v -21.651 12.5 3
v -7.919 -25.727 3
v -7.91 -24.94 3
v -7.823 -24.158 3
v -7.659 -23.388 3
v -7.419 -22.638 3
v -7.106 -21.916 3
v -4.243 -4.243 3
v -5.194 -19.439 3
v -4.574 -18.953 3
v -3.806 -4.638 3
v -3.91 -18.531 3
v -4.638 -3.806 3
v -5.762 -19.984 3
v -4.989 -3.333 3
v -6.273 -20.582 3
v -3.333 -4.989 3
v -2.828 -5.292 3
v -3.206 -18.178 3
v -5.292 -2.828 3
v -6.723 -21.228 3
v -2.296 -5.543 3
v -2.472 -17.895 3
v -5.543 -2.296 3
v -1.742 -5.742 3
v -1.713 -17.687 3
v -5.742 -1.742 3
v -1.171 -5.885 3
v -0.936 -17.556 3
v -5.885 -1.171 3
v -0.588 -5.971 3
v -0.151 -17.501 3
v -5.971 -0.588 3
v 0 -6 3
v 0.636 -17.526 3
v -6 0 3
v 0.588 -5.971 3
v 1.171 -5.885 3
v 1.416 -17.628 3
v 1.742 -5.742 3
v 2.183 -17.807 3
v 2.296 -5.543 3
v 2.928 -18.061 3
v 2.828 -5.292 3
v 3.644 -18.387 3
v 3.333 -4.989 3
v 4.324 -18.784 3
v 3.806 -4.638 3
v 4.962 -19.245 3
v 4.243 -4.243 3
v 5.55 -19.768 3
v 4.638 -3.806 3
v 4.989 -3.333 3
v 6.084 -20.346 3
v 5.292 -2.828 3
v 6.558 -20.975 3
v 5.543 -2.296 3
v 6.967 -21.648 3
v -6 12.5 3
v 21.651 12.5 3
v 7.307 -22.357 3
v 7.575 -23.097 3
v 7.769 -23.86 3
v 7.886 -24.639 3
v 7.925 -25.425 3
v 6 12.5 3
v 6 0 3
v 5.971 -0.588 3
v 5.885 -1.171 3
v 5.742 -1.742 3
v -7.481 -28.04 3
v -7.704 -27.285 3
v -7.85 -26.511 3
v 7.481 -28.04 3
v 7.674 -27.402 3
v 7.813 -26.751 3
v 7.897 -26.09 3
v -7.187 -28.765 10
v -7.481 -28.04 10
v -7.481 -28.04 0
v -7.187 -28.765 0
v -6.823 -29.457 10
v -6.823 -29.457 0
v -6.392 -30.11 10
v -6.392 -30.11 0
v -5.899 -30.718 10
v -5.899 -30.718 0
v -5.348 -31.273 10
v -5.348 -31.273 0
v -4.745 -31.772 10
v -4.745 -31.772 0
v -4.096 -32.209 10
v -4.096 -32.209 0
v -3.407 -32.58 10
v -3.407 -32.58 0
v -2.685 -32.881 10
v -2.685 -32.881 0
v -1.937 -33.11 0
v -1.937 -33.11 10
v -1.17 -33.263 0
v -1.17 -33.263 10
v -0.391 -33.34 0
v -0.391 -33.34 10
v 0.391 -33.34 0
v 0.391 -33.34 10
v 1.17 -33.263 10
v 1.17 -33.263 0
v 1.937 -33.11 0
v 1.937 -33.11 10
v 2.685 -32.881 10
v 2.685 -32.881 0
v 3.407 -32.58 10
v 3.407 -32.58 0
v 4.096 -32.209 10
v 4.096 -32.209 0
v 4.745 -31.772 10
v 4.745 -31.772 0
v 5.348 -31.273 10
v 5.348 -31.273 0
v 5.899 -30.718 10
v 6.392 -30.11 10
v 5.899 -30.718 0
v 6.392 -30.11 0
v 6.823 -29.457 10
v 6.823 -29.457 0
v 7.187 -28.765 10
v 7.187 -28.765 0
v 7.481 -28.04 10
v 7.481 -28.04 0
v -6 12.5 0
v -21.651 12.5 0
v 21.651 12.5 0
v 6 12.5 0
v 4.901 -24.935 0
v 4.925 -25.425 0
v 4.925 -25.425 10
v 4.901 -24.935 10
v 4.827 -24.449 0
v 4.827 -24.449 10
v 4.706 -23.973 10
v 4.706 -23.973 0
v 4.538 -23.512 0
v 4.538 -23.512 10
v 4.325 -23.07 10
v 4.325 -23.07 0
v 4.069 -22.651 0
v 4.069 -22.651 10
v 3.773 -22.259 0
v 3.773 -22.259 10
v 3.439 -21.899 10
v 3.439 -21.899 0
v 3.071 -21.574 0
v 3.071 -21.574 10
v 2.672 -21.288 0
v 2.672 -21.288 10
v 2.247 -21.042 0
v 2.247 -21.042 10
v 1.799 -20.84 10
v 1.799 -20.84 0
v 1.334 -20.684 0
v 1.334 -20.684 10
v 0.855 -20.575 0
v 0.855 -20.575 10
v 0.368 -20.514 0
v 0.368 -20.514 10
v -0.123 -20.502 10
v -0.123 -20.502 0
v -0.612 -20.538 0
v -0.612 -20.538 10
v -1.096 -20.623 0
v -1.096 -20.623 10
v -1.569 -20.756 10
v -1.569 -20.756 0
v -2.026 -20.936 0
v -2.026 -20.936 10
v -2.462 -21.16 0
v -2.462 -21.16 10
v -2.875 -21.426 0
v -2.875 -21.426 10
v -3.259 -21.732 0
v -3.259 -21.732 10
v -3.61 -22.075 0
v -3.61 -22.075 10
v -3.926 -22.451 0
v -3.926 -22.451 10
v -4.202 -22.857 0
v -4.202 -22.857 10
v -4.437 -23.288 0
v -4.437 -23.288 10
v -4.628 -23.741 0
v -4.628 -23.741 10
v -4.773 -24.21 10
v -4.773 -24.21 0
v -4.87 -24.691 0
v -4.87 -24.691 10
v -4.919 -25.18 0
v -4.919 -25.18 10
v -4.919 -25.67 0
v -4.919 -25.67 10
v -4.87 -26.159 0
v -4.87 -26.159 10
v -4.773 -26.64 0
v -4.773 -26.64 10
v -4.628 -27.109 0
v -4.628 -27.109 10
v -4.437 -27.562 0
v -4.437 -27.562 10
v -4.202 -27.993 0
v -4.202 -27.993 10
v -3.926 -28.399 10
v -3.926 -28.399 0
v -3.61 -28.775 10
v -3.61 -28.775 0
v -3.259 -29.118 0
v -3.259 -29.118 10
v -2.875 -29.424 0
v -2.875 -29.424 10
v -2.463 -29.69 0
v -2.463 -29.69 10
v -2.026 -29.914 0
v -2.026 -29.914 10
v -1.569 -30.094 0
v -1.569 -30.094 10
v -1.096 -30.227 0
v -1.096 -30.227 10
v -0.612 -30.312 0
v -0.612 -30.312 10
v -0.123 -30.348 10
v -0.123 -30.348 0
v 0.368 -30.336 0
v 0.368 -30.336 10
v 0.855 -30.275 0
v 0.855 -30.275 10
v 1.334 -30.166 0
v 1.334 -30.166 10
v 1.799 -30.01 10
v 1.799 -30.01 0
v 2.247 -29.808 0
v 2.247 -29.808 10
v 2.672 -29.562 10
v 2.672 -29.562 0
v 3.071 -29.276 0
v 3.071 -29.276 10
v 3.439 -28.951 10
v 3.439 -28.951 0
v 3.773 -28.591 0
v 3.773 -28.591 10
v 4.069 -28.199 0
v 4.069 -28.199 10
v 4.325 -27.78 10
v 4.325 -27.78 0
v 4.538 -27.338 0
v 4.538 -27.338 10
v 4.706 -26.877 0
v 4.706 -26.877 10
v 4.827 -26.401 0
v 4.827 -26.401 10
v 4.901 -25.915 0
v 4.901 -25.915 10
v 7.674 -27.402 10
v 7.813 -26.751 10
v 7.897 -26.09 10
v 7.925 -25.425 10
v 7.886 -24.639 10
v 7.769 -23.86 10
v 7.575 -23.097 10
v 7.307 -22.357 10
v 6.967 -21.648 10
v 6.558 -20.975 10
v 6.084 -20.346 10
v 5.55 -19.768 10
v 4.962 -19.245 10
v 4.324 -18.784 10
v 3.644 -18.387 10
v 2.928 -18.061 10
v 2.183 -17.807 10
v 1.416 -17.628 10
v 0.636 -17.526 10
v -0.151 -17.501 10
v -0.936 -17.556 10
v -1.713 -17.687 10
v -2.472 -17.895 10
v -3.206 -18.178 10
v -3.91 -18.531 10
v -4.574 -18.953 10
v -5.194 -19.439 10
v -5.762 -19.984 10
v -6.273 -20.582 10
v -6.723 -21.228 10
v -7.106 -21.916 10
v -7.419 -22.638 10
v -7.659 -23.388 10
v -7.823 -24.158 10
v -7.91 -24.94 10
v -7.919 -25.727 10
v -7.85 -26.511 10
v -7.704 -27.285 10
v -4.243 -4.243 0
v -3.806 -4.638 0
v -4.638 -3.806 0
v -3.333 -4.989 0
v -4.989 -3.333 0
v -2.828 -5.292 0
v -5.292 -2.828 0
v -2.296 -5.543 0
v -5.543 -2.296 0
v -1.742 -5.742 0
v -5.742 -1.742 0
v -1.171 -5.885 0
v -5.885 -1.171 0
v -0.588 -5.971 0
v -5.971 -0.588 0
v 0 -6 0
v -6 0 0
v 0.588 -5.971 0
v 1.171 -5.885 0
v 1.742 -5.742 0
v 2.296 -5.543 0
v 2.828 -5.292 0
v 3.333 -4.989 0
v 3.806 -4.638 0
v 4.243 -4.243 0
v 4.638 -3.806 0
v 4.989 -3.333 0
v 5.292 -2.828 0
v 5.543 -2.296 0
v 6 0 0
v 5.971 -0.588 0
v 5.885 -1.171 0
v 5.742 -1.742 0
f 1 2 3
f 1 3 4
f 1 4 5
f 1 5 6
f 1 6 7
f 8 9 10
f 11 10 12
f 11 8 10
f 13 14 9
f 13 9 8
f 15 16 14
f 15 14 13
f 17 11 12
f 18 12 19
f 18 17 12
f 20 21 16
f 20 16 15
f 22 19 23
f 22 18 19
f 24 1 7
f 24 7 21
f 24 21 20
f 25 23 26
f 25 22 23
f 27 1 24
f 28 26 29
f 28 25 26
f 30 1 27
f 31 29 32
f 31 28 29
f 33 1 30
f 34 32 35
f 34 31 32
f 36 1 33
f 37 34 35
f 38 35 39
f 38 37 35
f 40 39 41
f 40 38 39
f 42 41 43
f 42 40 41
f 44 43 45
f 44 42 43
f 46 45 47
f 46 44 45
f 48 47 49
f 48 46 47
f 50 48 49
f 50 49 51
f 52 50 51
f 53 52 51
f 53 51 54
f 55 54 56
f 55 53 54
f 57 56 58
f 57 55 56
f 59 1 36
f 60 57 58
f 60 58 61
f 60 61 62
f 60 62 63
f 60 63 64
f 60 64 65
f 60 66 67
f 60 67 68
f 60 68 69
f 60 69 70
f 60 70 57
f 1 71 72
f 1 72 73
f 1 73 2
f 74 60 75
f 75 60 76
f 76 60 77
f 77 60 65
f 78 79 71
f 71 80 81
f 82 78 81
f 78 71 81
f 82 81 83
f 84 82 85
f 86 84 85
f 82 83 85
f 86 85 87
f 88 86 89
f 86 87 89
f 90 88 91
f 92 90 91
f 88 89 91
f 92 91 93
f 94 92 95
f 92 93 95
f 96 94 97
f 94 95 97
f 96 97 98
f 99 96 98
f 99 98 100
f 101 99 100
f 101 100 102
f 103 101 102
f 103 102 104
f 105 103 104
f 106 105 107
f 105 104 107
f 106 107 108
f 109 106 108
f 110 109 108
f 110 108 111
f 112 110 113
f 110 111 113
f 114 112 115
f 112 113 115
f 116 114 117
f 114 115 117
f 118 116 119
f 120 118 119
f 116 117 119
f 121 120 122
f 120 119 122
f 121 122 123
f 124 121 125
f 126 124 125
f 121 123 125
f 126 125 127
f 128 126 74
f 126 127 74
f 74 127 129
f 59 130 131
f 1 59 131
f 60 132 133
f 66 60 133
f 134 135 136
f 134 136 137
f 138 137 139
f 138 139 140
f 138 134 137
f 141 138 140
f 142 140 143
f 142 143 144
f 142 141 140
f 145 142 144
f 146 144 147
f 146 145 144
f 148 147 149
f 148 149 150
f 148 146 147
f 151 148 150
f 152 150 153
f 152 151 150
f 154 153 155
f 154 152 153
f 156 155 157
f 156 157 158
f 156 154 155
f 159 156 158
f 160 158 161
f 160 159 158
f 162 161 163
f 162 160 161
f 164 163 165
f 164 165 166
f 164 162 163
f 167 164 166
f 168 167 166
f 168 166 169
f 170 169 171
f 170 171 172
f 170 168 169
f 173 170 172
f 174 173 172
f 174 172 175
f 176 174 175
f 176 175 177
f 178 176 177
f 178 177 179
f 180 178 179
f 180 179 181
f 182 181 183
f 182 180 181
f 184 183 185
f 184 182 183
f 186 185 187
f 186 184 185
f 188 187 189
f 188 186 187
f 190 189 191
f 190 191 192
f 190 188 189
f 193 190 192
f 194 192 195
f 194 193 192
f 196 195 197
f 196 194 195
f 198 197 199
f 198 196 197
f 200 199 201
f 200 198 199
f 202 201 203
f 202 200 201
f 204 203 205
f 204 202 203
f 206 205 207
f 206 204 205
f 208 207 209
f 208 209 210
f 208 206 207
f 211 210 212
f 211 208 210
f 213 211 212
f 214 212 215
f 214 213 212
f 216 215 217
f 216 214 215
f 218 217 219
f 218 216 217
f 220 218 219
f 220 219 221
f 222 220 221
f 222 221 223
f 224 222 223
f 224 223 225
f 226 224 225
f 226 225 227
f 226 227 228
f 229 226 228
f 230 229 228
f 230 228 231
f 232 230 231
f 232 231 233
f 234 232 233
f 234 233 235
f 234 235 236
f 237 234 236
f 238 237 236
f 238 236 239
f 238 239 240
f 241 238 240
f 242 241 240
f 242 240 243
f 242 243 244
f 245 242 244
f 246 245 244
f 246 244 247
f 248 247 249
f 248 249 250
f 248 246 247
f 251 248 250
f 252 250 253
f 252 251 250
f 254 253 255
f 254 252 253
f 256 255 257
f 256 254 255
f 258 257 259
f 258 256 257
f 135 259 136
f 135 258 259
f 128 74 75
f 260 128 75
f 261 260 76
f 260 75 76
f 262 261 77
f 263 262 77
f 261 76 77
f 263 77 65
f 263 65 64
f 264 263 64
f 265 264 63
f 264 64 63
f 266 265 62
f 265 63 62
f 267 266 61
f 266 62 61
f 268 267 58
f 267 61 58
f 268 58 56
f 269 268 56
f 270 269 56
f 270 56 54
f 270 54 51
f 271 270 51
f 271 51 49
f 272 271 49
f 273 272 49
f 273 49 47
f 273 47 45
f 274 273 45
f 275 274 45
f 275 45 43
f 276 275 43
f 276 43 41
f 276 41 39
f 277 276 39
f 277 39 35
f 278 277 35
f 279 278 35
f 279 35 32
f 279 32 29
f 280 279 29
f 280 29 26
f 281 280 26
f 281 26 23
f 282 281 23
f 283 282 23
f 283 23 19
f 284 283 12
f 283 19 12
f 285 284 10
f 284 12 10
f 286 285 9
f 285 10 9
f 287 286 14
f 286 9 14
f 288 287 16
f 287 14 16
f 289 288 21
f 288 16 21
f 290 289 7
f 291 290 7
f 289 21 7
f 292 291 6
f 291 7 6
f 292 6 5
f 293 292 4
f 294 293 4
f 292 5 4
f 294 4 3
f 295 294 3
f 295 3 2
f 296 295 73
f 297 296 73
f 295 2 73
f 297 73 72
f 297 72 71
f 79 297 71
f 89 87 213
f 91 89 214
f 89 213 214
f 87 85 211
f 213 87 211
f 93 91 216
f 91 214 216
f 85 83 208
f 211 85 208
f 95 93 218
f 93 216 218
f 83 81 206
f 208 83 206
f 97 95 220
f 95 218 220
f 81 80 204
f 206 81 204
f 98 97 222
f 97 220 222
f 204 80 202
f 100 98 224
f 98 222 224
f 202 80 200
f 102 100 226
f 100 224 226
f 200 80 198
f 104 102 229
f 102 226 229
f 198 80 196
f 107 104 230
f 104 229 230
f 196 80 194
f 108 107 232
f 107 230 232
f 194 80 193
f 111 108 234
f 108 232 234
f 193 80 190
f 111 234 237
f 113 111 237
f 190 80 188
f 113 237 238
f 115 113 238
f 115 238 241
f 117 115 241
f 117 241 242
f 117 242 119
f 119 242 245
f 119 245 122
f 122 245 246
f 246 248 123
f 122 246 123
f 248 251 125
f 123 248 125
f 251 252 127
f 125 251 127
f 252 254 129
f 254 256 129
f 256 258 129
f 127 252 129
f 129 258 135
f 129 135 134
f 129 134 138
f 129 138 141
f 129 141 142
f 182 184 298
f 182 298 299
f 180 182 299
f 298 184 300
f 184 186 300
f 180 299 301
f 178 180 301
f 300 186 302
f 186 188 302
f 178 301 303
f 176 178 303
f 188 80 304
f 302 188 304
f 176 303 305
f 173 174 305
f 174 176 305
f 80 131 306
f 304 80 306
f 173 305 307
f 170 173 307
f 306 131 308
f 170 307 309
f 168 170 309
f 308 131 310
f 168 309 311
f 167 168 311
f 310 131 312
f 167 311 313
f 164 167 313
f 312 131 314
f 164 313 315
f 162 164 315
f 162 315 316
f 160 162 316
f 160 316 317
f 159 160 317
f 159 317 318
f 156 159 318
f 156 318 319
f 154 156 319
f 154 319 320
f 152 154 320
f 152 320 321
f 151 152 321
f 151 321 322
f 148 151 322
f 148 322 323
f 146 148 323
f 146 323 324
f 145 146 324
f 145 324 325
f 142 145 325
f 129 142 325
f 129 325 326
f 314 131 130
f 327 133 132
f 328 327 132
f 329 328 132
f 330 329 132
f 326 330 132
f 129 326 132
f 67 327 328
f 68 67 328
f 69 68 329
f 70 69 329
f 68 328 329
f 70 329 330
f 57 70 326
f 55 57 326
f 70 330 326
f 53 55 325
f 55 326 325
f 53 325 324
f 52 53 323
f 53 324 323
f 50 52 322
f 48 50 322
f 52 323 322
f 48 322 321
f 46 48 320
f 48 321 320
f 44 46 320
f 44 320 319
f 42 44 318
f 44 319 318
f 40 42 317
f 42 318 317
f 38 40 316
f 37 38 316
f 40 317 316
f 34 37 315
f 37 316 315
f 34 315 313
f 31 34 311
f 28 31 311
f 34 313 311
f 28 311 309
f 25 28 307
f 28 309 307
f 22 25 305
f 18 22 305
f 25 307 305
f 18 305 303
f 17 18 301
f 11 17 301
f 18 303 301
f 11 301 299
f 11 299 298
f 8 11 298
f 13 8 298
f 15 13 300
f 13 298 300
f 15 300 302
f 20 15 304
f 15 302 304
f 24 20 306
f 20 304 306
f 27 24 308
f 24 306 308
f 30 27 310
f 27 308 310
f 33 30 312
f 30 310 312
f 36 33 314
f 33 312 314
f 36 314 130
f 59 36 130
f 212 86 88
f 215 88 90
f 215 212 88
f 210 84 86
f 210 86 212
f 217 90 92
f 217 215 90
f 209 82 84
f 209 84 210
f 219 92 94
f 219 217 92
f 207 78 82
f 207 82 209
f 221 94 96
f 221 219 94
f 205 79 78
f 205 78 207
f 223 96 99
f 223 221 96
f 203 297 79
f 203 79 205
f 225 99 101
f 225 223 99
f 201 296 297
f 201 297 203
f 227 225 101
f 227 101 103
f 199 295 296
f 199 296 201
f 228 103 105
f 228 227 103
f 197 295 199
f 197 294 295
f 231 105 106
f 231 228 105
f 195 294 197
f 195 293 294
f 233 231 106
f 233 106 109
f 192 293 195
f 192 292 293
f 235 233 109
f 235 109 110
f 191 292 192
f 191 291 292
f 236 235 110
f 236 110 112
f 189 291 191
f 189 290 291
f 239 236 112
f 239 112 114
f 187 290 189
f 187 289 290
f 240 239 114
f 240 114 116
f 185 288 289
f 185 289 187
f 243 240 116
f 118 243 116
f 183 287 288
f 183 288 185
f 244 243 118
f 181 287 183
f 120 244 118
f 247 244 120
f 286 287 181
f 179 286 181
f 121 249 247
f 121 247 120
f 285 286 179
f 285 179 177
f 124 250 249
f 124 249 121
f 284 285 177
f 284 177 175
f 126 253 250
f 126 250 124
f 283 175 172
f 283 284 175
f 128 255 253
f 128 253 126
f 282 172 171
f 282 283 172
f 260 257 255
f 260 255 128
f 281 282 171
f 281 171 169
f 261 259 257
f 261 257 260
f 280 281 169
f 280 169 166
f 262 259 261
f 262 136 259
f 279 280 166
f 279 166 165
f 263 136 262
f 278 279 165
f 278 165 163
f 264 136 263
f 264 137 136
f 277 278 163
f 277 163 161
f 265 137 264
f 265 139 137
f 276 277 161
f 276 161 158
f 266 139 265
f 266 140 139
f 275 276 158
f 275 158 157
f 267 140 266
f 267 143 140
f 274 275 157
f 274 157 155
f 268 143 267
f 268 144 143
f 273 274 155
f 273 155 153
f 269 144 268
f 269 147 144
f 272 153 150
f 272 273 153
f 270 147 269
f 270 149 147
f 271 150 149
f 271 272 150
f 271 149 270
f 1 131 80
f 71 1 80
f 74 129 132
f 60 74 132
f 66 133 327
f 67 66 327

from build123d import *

# Parameters (mm, degrees)
F0_R     = 4.925
F1_DEPTH = 10
F2_DEPTH = 3


with BuildPart() as f1:
    # F0 (on Top) → F1 (new body)
    with BuildSketch(Plane.XY):
        with BuildLine():
            ThreePointArc((7.925, -25.425), (-1.326108, -17.611738), (-7.481199, -28.039821))
            ThreePointArc((-7.481199, -28.039821), (0, -33.35), (7.481199, -28.039821))
            ThreePointArc((7.481199, -28.039821), (7.813262, -26.751108), (7.925, -25.425))
        make_face()
        with Locations((0, -25.425)):
            Circle(F0_R, mode=Mode.SUBTRACT)
    extrude(amount=F1_DEPTH)

    # F0 (on Top) → F2 (join)
    with BuildSketch(Plane.XY):
        with BuildLine():
            Line((-6, 12.5), (-21.650635, 12.5))
            Line((-21.650635, 12.5), (-7.481199, -28.039821))
            ThreePointArc((-7.481199, -28.039821), (-1.326108, -17.611738), (7.925, -25.425))
            ThreePointArc((7.925, -25.425), (7.813262, -26.751108), (7.481199, -28.039821))
            Line((7.481199, -28.039821), (21.650635, 12.5))
            Line((21.650635, 12.5), (6, 12.5))
            Line((6, 12.5), (6, 0))
            ThreePointArc((6, 0), (0, -6), (-6, 0))
            Line((-6, 0), (-6, 12.5))
        make_face()
    extrude(amount=F2_DEPTH)


solid = f1.part
